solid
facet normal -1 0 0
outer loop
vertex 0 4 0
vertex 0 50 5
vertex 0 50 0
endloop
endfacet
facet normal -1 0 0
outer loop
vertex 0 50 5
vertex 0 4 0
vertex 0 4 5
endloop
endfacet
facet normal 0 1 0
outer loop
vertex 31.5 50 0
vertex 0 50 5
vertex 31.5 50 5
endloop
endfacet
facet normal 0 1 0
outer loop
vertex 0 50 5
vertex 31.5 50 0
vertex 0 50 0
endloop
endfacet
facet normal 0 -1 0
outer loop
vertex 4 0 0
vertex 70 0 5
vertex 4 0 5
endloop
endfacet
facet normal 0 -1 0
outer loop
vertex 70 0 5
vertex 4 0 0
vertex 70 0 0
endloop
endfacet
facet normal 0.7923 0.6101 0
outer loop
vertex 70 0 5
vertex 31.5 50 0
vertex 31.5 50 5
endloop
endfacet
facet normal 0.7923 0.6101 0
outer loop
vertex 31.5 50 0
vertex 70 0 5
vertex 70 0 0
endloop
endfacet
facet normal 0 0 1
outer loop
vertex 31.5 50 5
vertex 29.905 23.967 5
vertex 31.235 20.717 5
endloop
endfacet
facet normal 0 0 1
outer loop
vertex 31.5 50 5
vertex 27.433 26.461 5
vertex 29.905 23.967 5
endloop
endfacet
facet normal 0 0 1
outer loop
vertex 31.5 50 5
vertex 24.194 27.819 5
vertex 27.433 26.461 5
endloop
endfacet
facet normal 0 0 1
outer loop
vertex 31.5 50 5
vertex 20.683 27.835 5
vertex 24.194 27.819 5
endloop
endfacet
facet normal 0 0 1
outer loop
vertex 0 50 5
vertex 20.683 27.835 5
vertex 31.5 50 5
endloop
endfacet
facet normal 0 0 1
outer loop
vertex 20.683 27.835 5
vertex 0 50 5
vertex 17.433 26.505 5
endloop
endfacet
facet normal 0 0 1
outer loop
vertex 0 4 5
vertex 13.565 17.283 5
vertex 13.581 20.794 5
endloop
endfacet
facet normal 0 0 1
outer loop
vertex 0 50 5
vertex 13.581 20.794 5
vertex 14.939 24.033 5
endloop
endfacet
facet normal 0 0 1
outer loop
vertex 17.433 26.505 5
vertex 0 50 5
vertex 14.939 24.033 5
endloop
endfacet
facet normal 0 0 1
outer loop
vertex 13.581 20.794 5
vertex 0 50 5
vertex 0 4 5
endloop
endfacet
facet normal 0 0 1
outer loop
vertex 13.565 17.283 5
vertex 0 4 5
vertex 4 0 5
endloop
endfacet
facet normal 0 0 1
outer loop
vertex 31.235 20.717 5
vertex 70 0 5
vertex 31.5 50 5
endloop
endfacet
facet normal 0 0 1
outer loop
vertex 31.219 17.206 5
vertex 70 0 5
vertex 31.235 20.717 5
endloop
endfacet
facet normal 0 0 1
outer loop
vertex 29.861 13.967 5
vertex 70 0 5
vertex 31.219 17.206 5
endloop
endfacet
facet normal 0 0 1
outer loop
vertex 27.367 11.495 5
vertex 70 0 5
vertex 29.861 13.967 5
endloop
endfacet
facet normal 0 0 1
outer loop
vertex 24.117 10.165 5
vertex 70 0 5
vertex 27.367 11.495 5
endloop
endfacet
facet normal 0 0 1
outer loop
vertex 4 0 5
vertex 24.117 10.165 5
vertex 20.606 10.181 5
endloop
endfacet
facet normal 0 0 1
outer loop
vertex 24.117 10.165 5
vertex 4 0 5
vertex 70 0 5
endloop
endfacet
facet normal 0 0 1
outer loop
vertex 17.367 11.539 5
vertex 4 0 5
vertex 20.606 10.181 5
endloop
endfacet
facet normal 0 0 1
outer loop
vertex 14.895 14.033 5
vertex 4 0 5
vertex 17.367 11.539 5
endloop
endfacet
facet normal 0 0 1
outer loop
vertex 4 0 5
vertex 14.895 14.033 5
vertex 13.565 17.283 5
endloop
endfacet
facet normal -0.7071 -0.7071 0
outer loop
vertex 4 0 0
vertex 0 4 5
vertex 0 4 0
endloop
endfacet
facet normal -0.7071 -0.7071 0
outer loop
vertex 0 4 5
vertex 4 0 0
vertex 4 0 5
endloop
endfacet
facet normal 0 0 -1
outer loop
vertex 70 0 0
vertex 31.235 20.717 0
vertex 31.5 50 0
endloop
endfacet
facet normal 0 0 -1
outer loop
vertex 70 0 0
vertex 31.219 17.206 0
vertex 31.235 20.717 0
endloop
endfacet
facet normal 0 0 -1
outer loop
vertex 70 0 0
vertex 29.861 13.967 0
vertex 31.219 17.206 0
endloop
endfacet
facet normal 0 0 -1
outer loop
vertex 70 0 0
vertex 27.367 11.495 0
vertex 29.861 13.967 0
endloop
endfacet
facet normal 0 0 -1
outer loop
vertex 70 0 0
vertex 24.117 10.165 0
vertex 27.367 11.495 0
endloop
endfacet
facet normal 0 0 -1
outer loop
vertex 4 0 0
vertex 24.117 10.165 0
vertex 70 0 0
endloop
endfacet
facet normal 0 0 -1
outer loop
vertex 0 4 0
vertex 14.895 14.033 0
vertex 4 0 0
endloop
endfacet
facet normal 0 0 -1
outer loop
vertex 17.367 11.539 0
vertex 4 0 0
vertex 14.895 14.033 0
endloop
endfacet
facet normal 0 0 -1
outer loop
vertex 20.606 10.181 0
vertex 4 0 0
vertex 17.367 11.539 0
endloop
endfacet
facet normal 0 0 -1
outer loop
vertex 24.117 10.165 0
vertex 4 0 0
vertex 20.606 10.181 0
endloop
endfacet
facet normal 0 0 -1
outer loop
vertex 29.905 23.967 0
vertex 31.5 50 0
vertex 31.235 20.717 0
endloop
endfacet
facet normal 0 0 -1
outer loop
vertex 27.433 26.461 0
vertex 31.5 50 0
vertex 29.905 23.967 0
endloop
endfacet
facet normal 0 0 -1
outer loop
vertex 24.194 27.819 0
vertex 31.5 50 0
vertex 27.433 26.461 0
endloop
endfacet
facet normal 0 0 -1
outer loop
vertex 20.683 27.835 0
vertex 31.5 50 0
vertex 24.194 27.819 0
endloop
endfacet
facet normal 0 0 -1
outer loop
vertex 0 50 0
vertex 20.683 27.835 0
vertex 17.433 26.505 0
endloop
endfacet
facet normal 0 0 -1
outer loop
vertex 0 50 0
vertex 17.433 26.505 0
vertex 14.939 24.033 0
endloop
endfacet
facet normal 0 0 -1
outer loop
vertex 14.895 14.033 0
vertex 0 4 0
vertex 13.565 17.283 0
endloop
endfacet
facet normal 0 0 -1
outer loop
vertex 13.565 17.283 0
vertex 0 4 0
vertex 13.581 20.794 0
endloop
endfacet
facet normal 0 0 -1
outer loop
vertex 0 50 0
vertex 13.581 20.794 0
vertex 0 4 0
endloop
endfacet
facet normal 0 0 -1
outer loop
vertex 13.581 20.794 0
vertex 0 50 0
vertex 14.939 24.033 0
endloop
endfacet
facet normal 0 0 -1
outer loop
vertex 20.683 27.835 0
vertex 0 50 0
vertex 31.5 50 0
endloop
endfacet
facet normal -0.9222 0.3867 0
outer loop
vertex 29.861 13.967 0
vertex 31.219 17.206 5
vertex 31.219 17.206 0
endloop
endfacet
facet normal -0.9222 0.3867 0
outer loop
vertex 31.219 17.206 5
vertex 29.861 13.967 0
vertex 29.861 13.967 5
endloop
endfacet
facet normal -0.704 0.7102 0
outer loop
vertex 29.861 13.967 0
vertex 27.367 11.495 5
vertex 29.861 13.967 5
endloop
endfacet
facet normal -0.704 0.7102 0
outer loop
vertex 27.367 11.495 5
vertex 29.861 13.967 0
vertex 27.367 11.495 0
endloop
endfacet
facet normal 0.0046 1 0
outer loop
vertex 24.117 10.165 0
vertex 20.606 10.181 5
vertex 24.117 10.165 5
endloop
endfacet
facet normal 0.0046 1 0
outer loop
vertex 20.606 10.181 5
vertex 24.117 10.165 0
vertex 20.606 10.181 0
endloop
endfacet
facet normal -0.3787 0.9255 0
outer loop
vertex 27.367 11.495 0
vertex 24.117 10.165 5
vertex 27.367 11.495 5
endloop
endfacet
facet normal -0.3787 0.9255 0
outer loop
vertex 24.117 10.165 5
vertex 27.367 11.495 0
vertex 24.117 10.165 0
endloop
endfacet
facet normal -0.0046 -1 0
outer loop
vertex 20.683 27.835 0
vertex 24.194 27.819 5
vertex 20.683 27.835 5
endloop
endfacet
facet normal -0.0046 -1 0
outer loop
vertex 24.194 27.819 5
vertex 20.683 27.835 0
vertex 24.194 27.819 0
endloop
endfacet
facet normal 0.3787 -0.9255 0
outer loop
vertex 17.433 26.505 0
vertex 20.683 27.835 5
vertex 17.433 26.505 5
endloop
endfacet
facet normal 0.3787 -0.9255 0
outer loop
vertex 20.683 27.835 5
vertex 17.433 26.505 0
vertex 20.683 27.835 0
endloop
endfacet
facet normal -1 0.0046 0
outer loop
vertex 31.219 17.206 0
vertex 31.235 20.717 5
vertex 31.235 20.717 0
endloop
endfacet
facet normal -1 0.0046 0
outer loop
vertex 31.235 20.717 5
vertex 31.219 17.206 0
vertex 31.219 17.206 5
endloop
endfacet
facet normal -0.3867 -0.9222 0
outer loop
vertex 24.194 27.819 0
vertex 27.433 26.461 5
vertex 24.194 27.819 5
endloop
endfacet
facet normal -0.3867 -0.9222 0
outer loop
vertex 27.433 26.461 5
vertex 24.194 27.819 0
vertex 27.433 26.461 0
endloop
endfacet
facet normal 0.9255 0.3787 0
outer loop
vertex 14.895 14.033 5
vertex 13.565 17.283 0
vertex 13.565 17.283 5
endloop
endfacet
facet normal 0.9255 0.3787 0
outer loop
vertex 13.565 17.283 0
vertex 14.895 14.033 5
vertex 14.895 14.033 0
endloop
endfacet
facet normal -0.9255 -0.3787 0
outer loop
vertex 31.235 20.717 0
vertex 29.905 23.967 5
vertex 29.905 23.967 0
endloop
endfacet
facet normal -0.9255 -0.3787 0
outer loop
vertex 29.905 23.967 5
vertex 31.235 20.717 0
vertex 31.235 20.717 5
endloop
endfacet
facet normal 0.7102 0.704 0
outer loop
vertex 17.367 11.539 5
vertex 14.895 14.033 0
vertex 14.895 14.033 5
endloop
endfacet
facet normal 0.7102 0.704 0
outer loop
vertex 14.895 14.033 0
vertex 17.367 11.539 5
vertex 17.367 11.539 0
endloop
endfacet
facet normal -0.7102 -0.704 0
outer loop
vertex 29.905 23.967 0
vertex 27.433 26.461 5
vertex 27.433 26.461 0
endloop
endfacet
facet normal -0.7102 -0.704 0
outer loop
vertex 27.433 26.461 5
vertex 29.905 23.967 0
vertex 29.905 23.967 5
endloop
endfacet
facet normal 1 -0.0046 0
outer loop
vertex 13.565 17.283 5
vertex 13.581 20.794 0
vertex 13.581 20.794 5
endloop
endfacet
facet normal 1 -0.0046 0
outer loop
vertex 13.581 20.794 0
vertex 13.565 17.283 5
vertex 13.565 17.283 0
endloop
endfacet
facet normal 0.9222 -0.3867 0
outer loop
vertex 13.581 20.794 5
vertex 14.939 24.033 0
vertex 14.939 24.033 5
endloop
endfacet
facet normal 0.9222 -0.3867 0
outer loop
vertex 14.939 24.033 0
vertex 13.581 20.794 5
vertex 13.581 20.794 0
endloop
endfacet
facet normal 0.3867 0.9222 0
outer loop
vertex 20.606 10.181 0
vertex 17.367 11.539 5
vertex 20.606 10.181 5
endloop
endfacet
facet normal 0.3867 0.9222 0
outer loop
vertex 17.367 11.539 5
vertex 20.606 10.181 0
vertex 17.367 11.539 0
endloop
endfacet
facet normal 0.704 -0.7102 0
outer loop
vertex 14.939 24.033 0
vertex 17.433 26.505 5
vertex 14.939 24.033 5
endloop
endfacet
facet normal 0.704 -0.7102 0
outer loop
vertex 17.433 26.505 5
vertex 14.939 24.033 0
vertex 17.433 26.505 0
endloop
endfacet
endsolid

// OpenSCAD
$fn = 32;

// ----------------------------------------------------------------------
// Bracket plate: gusset 70 x 50
// ----------------------------------------------------------------------

// --- parameters (mm) ---
hole_r = 4;               // bolt hole radius
plate_t = 5;              // plate thickness, Z (extrusion height)
gus_a = 70;               // base length
gus_b = 50;               // height
top_x = 31.5;             // top edge X of the angled cut
light_r = 9;              // lightening hole radius
fit_tol = 0.05;           // declared fit tolerance (prompt contract)
free_tol = 0.2;           // declared free tolerance (prompt contract)

light_d = 2 * light_r;

profile = [[4, 0], [35, 0], [70, 0], [31.5, 50], [0, 50], [0, 4]];  // primary outline, 6 points, counter clockwise
void_1 = [[31.235, 20.717], [29.905, 23.967], [27.433, 26.461], [24.194, 27.819], [20.683, 27.835], [17.433, 26.505], [14.939, 24.033], [13.581, 20.794], [13.565, 17.283], [14.895, 14.033], [17.367, 11.539], [20.606, 10.181], [24.117, 10.165], [27.367, 11.495], [29.861, 13.967], [31.219, 17.206]];  // lightening hole, 16 points

// --- the one profile operation ---
difference() {
  linear_extrude(height = plate_t) polygon(points = profile);
  translate([0, 0, -1])
    linear_extrude(height = plate_t + 2) polygon(points = void_1);
}
